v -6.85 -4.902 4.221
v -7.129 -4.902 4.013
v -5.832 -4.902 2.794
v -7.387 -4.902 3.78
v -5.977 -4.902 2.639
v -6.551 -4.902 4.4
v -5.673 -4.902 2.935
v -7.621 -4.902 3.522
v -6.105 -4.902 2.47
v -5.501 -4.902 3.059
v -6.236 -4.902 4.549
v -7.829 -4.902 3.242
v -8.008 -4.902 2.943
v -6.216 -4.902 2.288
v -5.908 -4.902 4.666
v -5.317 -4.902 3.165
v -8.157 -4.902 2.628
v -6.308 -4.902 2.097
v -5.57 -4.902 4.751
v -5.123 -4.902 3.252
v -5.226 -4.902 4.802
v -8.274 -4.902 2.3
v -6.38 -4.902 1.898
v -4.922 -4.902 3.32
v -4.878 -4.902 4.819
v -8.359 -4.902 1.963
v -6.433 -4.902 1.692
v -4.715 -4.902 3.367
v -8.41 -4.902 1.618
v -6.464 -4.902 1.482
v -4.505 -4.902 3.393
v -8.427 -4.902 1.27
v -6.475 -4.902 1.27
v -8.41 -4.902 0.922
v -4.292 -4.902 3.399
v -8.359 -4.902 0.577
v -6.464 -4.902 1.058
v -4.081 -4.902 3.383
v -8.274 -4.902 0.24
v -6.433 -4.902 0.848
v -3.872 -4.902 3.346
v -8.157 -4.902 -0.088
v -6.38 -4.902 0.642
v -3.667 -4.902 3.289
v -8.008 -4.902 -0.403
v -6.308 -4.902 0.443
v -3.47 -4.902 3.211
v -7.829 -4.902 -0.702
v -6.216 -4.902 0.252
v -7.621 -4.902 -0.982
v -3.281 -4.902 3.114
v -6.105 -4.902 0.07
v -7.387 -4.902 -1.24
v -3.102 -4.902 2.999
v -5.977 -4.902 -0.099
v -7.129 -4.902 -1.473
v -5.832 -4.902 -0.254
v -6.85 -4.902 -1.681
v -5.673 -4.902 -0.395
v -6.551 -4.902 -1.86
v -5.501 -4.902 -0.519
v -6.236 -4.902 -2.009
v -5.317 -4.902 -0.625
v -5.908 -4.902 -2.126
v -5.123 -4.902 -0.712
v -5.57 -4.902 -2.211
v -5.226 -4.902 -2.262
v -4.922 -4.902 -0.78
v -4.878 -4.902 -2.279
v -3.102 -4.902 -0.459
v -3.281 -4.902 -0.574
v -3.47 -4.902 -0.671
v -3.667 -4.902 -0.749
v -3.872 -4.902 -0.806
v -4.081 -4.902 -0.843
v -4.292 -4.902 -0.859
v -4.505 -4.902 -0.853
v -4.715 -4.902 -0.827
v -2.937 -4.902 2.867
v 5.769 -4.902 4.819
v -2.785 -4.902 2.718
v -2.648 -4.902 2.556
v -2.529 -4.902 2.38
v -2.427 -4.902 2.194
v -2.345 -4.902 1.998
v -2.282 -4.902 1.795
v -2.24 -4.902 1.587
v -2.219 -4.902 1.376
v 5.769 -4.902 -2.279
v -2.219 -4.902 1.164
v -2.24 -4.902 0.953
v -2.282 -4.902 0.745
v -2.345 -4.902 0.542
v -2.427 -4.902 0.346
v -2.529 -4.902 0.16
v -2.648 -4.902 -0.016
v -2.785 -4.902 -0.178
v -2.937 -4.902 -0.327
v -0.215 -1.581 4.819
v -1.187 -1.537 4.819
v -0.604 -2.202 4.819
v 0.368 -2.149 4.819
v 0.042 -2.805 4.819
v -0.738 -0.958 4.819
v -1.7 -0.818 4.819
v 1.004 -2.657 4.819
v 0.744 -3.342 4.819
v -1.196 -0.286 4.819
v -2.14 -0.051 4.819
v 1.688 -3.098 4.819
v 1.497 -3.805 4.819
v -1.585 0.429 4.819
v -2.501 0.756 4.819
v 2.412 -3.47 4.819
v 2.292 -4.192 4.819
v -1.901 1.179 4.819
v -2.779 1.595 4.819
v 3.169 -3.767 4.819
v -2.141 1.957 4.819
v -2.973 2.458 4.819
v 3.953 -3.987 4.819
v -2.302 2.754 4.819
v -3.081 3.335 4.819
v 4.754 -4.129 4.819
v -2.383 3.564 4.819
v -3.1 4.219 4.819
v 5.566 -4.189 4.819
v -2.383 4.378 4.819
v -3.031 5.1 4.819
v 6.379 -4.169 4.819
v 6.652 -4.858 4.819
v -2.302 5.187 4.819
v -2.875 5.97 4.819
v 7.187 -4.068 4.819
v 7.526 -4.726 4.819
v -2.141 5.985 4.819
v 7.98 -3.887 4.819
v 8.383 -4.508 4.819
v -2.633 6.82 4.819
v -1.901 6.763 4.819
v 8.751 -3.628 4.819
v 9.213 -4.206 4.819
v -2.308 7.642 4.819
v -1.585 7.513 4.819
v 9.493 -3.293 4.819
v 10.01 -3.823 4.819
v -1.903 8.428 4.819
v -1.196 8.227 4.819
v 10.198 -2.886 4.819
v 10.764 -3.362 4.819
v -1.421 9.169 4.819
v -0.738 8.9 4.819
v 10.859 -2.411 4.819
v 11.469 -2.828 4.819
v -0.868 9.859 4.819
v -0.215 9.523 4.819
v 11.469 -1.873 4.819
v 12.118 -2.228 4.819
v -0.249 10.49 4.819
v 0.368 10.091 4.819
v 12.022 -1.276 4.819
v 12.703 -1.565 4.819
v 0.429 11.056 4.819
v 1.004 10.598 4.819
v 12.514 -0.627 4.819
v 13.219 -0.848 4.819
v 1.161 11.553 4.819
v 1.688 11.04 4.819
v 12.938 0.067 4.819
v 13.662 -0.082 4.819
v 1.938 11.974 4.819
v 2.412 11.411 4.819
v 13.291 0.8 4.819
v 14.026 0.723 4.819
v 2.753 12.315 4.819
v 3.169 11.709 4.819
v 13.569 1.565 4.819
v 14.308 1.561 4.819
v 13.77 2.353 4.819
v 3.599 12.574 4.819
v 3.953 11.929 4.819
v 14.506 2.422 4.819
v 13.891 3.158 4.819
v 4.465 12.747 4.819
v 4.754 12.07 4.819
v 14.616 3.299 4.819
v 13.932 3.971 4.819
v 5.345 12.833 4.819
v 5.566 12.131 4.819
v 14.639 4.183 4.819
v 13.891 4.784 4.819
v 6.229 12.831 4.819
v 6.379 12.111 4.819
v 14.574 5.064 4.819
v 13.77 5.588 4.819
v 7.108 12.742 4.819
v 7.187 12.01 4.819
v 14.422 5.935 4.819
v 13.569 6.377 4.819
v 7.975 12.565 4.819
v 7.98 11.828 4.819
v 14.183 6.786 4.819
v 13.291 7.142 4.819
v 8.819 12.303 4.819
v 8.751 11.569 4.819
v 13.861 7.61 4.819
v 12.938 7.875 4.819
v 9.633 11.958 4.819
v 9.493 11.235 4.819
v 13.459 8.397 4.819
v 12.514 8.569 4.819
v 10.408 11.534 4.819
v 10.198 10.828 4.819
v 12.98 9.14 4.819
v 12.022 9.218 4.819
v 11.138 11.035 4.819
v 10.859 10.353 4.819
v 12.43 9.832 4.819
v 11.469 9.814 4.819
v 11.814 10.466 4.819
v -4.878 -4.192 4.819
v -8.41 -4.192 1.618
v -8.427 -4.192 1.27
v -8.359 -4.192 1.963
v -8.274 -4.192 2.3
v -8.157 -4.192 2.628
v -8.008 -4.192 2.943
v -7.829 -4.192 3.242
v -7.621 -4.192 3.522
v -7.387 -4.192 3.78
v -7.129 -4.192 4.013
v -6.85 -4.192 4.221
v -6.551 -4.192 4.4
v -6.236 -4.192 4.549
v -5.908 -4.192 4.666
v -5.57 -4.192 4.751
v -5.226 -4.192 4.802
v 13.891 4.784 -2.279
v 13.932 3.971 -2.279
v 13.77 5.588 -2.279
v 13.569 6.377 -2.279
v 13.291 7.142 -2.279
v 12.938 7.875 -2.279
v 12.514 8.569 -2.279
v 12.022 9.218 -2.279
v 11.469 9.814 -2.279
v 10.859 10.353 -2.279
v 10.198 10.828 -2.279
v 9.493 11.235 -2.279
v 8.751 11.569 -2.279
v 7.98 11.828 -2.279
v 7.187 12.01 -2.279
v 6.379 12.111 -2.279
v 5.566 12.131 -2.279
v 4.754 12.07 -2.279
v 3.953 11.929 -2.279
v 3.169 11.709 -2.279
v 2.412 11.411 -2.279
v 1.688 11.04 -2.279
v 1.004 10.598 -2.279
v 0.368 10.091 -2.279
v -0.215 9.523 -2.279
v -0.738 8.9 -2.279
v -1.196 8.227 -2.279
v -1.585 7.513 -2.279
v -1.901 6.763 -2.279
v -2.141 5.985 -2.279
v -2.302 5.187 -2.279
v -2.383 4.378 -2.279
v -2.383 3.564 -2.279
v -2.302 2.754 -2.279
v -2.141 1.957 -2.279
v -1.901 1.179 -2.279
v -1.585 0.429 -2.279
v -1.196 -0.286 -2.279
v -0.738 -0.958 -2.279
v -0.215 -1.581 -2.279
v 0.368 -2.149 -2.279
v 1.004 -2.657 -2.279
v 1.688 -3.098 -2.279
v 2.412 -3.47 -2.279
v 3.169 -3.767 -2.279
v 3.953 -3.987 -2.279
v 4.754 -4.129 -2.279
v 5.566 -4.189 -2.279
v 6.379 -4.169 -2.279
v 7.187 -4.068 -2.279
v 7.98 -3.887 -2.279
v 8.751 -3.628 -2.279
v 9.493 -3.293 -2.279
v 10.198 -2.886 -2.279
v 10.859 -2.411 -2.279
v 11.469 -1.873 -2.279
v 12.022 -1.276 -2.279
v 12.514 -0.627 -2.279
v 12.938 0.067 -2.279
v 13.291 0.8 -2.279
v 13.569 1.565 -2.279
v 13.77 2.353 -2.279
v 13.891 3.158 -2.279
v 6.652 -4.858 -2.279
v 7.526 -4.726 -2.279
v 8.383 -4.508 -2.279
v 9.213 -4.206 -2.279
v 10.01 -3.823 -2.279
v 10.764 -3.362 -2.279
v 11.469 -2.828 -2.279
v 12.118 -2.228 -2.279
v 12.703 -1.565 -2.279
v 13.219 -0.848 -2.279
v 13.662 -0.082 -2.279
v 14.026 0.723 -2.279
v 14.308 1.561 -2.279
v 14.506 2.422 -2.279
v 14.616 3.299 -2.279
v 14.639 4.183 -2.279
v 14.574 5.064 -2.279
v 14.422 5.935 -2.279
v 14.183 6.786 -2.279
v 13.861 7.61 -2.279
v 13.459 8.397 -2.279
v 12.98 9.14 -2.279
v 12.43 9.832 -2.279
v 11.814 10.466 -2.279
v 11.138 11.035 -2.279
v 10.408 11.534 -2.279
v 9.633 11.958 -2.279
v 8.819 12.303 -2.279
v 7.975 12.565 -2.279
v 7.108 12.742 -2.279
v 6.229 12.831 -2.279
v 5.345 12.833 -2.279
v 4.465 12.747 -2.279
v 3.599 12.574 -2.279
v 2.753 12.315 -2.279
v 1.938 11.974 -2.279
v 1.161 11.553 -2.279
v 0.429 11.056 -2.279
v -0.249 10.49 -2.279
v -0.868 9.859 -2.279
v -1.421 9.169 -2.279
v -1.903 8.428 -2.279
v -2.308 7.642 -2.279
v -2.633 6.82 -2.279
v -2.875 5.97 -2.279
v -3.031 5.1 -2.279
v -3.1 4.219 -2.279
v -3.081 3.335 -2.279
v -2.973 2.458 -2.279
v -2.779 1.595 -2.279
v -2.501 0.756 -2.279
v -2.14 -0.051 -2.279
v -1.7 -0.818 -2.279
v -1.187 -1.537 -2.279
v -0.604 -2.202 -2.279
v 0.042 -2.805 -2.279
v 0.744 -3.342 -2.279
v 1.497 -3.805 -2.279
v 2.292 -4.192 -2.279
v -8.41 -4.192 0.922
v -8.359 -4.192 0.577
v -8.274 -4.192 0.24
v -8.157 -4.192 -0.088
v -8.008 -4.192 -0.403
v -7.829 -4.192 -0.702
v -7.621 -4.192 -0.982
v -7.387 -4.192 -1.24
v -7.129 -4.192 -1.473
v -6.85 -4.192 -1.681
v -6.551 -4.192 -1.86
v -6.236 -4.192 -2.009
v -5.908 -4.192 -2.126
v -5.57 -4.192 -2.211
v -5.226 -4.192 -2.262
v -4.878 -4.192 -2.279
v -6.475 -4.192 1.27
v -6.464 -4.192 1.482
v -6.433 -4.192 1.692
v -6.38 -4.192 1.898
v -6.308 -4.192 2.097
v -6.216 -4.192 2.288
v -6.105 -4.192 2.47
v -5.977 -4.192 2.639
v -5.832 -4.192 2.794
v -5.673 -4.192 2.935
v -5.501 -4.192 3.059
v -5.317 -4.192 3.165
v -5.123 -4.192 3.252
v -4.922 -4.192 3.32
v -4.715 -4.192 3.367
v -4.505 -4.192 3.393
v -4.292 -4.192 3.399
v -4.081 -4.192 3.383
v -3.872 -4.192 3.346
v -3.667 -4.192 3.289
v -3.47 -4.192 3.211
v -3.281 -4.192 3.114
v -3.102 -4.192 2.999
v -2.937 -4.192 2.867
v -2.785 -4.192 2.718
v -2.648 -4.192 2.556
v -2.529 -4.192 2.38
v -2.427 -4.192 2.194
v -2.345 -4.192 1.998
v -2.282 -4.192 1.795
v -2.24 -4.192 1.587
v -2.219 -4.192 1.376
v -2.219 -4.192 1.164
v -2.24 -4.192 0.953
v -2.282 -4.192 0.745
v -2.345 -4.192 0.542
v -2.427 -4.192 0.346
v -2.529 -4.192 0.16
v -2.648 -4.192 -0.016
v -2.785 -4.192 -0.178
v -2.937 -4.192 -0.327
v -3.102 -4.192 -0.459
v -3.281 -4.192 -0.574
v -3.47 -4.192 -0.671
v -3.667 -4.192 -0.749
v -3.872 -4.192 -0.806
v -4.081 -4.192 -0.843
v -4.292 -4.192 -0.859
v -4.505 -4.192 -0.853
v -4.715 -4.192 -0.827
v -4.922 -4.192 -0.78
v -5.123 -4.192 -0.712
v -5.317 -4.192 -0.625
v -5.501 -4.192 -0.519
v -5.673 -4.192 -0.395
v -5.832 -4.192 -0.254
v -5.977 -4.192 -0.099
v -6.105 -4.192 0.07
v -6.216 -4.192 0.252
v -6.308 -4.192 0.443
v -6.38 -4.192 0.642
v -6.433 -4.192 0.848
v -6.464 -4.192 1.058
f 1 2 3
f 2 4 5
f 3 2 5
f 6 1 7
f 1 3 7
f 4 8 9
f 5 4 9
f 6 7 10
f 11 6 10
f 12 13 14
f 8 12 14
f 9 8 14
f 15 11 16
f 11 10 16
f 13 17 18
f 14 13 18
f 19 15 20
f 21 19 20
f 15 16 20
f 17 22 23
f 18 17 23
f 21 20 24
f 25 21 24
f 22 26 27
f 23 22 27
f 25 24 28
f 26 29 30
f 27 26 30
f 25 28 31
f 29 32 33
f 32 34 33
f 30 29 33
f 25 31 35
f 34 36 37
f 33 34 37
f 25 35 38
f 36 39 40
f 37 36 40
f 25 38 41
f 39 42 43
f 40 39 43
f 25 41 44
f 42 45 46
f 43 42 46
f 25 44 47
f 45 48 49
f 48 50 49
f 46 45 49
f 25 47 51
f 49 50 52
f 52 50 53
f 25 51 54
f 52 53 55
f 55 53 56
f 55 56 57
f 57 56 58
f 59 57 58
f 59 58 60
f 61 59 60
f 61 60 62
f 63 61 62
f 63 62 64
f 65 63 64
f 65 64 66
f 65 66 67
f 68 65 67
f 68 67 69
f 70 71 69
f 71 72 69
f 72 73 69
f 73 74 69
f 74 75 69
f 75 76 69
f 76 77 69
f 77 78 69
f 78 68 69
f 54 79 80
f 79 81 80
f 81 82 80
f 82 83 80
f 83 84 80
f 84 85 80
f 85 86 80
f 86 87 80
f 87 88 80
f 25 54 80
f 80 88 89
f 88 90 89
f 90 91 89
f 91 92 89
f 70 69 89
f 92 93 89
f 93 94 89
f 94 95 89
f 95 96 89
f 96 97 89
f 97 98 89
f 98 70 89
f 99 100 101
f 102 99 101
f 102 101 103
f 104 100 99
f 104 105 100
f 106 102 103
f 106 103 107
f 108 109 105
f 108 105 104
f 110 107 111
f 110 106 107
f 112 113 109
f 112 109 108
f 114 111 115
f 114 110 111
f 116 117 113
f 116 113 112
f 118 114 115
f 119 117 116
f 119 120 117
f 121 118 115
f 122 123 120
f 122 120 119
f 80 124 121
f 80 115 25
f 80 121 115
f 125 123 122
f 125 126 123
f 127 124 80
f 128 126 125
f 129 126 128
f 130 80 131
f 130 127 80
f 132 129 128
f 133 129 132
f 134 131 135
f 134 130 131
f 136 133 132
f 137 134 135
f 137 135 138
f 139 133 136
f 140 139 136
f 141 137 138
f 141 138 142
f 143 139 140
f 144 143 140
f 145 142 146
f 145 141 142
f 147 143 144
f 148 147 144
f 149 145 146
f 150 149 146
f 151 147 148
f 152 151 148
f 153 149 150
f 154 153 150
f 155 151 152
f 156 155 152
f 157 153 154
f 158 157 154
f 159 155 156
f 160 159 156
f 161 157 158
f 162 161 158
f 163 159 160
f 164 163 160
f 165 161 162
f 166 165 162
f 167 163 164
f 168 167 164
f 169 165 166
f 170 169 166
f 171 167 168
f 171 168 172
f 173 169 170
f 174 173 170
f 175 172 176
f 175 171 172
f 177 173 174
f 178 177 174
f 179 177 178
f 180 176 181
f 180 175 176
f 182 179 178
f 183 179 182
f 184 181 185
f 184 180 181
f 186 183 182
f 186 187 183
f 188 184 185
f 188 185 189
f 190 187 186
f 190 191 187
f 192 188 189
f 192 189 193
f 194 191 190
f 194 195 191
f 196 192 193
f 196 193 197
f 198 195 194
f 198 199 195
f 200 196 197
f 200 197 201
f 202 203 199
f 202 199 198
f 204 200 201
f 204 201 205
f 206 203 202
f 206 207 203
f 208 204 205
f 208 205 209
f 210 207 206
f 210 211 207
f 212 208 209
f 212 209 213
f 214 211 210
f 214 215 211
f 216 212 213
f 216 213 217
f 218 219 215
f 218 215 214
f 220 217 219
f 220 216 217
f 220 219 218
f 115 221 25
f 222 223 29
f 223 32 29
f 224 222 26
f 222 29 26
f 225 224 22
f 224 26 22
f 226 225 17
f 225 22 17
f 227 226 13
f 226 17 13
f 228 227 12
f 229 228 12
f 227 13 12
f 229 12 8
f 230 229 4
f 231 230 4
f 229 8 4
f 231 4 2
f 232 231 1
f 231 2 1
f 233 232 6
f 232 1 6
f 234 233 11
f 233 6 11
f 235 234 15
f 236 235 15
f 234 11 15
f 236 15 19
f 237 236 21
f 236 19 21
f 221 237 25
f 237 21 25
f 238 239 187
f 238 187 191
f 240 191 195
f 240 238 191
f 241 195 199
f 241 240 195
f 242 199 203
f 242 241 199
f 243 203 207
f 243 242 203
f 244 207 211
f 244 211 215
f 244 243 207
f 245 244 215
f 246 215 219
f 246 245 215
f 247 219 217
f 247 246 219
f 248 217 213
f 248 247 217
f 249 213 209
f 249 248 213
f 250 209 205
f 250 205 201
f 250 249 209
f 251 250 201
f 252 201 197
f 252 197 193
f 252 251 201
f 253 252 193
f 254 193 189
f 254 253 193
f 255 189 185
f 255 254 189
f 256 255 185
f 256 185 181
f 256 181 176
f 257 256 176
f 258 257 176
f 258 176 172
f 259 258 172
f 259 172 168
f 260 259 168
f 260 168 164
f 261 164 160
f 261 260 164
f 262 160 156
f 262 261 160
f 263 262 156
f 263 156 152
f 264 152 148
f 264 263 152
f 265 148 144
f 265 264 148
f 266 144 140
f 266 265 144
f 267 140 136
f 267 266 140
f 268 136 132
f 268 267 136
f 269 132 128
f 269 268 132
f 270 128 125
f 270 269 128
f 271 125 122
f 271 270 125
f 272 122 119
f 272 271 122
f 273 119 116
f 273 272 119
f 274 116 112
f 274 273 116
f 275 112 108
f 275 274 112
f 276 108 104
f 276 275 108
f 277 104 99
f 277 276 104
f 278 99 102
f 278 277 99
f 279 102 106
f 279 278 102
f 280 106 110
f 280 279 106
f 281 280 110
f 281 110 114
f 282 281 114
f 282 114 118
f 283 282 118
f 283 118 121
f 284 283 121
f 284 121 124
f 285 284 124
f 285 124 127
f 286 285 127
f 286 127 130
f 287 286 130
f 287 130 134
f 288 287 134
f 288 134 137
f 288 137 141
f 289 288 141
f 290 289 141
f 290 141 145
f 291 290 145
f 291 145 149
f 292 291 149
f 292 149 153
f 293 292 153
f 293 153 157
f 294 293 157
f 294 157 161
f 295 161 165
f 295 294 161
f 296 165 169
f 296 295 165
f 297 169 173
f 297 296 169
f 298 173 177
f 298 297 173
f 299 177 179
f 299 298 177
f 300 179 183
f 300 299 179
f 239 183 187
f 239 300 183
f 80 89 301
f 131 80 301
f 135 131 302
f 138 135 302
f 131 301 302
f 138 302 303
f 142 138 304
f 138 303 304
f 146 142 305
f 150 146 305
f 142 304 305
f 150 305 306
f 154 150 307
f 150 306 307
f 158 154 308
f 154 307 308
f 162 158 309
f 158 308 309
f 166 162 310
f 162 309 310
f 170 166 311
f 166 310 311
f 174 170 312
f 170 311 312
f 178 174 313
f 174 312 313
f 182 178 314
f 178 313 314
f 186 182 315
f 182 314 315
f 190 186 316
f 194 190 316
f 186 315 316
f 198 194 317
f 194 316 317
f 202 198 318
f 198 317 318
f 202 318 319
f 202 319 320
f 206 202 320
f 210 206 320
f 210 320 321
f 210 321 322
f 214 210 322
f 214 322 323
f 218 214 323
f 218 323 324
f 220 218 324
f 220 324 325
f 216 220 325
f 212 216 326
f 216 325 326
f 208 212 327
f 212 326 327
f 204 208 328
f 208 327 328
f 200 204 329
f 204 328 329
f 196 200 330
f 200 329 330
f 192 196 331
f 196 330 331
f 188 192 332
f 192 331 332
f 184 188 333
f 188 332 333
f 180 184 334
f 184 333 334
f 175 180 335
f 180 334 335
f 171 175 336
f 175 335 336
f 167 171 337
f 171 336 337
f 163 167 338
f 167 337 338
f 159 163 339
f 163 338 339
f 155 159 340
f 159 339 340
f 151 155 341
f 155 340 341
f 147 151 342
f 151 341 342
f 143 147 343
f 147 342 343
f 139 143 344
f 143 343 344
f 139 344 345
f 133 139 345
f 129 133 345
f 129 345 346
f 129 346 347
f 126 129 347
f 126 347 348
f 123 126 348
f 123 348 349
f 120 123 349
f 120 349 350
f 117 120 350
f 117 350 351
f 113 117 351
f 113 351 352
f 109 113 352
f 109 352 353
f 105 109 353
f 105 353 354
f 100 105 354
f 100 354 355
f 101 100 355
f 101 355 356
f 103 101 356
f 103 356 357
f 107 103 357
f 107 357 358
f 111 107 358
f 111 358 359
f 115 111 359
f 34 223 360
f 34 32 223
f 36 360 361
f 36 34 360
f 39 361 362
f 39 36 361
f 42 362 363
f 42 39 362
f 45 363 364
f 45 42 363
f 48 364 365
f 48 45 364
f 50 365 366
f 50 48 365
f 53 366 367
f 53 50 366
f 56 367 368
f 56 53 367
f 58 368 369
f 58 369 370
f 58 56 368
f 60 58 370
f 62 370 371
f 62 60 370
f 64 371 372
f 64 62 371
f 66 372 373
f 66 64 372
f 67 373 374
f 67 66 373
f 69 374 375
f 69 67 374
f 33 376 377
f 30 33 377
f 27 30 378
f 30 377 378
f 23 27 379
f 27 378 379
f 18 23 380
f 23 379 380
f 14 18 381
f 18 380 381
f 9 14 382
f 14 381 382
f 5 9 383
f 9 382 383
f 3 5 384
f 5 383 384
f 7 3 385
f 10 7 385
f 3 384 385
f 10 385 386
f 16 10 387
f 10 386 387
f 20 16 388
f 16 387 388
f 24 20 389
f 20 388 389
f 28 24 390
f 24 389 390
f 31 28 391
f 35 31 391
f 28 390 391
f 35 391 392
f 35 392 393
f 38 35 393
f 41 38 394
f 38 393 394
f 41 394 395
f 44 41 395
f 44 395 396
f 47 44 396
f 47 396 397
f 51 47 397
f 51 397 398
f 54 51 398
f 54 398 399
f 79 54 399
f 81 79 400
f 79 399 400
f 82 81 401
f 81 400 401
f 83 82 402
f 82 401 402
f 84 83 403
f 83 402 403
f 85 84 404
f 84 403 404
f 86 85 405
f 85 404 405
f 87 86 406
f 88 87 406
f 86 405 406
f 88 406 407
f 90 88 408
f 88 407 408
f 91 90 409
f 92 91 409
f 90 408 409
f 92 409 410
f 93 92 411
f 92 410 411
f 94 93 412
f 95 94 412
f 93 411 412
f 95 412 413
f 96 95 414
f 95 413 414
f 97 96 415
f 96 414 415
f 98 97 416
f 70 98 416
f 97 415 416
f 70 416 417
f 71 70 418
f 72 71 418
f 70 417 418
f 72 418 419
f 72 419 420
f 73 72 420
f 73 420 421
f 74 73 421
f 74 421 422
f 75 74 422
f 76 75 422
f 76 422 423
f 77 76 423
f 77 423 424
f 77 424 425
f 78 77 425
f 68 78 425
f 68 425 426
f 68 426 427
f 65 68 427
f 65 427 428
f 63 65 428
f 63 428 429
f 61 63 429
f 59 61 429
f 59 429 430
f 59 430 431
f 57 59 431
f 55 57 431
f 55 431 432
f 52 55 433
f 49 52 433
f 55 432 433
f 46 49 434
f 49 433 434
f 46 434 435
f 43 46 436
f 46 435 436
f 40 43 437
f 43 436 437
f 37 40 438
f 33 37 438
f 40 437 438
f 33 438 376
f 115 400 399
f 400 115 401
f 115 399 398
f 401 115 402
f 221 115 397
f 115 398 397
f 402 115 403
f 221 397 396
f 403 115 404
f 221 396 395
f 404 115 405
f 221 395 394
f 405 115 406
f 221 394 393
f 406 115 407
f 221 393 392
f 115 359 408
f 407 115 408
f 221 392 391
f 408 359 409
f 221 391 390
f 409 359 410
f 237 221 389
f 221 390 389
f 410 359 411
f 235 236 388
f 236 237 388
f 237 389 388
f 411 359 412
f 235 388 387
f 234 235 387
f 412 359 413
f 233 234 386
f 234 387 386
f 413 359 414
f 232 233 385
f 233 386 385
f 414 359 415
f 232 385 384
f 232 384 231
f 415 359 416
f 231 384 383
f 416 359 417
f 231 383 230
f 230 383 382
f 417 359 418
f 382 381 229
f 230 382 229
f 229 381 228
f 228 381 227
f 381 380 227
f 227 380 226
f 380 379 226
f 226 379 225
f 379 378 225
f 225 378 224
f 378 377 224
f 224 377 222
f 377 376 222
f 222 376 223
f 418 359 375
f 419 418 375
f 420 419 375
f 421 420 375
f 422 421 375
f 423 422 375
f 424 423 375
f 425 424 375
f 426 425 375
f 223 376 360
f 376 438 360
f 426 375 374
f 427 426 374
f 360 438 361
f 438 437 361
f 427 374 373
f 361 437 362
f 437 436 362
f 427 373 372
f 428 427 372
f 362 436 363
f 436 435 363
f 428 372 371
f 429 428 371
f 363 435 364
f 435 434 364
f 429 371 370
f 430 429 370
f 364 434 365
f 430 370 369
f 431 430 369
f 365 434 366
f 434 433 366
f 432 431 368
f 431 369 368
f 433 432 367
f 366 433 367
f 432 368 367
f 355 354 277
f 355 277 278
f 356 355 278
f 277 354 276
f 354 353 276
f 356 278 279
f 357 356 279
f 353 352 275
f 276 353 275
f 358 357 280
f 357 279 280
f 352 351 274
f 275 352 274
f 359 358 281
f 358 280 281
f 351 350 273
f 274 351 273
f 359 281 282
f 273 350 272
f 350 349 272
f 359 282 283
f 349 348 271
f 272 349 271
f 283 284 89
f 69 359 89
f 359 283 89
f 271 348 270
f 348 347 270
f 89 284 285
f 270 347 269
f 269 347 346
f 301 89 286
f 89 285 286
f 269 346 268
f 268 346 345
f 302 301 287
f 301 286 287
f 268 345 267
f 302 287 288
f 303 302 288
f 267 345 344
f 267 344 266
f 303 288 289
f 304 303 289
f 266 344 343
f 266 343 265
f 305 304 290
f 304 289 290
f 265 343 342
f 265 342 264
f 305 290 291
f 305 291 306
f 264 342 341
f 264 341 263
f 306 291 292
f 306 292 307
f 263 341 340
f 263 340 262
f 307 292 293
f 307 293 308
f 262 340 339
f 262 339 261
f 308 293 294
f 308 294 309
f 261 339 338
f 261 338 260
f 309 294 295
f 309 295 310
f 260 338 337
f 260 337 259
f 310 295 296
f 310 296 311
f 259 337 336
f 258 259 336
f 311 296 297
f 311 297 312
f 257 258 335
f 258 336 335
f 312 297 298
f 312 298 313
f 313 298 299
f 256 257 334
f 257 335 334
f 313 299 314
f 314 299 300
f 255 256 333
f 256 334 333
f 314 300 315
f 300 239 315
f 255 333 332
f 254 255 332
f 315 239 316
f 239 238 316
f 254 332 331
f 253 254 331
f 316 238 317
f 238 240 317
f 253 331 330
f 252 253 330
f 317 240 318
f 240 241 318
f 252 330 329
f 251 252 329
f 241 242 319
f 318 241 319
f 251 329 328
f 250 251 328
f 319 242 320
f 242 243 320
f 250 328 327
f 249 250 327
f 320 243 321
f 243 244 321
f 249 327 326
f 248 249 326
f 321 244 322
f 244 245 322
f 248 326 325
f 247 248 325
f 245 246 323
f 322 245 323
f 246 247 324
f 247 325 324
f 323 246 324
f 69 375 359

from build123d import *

# Parameters (mm, degrees)
SKETCH1_R           = 2.921
BOSS_EXTRUDE1_DEPTH = 2.54
SKETCH3_R           = 0.762
CUT_EXTRUDE1_DEPTH  = 0.254
FILLET1_R           = 1.27
SCALE1_SCALE        = 2.43
SCALE3_SCALE        = 1.15


with BuildPart() as part:
    # Sketch1 → Boss-Extrude1 (new body)
    with BuildSketch(Plane.XY):
        with BuildLine():
            Line((0, 0), (5.08, 0))
            ThreePointArc((5.08, 0), (5.715, 6.285851973), (3.835659211, 0.254))
            Line((3.835659211, 0.254), (0, 0.254))
            Line((0, 0.254), (0, 0))
        make_face()
        with Locations((5.08, 3.175)):
            Circle(SKETCH1_R, mode=Mode.SUBTRACT)
    extrude(amount=BOSS_EXTRUDE1_DEPTH)

    # Sketch3 → Cut-Extrude1 (cut)
    with BuildSketch(Plane(origin=(0, 0.254, 0), x_dir=(1, 0, 0), z_dir=(0, 1, 0))):
        with Locations(Location((1.4605, -1.27, 0), (0, 0, 180))):
            Circle(SKETCH3_R)
    extrude(amount=-CUT_EXTRUDE1_DEPTH, mode=Mode.SUBTRACT)

    # Fillet1
    fillet1_edges = [part.edges().sort_by_distance(p)[0] for p in [
        (0, 0.127, 2.54),
        (0, 0.127, 0),
    ]]
    fillet(fillet1_edges, radius=FILLET1_R - 0.0001)  # a hair under: the kernel refuses the full size


with BuildPart() as part_1:
    # Scale1: scaled about (4.695948506, 2.731518553, 1.27)
    add(part.part.scale(SCALE1_SCALE).moved(Location((-6.715206364, -3.906071531, -1.8161))))


with BuildPart() as part_2:
    # Scale3: scaled about (4.695948505, 2.731518554, 1.27)
    add(part_1.part.scale(SCALE3_SCALE).moved(Location((-0.704392276, -0.409727783, -0.1905))))


solid = part_2.part
